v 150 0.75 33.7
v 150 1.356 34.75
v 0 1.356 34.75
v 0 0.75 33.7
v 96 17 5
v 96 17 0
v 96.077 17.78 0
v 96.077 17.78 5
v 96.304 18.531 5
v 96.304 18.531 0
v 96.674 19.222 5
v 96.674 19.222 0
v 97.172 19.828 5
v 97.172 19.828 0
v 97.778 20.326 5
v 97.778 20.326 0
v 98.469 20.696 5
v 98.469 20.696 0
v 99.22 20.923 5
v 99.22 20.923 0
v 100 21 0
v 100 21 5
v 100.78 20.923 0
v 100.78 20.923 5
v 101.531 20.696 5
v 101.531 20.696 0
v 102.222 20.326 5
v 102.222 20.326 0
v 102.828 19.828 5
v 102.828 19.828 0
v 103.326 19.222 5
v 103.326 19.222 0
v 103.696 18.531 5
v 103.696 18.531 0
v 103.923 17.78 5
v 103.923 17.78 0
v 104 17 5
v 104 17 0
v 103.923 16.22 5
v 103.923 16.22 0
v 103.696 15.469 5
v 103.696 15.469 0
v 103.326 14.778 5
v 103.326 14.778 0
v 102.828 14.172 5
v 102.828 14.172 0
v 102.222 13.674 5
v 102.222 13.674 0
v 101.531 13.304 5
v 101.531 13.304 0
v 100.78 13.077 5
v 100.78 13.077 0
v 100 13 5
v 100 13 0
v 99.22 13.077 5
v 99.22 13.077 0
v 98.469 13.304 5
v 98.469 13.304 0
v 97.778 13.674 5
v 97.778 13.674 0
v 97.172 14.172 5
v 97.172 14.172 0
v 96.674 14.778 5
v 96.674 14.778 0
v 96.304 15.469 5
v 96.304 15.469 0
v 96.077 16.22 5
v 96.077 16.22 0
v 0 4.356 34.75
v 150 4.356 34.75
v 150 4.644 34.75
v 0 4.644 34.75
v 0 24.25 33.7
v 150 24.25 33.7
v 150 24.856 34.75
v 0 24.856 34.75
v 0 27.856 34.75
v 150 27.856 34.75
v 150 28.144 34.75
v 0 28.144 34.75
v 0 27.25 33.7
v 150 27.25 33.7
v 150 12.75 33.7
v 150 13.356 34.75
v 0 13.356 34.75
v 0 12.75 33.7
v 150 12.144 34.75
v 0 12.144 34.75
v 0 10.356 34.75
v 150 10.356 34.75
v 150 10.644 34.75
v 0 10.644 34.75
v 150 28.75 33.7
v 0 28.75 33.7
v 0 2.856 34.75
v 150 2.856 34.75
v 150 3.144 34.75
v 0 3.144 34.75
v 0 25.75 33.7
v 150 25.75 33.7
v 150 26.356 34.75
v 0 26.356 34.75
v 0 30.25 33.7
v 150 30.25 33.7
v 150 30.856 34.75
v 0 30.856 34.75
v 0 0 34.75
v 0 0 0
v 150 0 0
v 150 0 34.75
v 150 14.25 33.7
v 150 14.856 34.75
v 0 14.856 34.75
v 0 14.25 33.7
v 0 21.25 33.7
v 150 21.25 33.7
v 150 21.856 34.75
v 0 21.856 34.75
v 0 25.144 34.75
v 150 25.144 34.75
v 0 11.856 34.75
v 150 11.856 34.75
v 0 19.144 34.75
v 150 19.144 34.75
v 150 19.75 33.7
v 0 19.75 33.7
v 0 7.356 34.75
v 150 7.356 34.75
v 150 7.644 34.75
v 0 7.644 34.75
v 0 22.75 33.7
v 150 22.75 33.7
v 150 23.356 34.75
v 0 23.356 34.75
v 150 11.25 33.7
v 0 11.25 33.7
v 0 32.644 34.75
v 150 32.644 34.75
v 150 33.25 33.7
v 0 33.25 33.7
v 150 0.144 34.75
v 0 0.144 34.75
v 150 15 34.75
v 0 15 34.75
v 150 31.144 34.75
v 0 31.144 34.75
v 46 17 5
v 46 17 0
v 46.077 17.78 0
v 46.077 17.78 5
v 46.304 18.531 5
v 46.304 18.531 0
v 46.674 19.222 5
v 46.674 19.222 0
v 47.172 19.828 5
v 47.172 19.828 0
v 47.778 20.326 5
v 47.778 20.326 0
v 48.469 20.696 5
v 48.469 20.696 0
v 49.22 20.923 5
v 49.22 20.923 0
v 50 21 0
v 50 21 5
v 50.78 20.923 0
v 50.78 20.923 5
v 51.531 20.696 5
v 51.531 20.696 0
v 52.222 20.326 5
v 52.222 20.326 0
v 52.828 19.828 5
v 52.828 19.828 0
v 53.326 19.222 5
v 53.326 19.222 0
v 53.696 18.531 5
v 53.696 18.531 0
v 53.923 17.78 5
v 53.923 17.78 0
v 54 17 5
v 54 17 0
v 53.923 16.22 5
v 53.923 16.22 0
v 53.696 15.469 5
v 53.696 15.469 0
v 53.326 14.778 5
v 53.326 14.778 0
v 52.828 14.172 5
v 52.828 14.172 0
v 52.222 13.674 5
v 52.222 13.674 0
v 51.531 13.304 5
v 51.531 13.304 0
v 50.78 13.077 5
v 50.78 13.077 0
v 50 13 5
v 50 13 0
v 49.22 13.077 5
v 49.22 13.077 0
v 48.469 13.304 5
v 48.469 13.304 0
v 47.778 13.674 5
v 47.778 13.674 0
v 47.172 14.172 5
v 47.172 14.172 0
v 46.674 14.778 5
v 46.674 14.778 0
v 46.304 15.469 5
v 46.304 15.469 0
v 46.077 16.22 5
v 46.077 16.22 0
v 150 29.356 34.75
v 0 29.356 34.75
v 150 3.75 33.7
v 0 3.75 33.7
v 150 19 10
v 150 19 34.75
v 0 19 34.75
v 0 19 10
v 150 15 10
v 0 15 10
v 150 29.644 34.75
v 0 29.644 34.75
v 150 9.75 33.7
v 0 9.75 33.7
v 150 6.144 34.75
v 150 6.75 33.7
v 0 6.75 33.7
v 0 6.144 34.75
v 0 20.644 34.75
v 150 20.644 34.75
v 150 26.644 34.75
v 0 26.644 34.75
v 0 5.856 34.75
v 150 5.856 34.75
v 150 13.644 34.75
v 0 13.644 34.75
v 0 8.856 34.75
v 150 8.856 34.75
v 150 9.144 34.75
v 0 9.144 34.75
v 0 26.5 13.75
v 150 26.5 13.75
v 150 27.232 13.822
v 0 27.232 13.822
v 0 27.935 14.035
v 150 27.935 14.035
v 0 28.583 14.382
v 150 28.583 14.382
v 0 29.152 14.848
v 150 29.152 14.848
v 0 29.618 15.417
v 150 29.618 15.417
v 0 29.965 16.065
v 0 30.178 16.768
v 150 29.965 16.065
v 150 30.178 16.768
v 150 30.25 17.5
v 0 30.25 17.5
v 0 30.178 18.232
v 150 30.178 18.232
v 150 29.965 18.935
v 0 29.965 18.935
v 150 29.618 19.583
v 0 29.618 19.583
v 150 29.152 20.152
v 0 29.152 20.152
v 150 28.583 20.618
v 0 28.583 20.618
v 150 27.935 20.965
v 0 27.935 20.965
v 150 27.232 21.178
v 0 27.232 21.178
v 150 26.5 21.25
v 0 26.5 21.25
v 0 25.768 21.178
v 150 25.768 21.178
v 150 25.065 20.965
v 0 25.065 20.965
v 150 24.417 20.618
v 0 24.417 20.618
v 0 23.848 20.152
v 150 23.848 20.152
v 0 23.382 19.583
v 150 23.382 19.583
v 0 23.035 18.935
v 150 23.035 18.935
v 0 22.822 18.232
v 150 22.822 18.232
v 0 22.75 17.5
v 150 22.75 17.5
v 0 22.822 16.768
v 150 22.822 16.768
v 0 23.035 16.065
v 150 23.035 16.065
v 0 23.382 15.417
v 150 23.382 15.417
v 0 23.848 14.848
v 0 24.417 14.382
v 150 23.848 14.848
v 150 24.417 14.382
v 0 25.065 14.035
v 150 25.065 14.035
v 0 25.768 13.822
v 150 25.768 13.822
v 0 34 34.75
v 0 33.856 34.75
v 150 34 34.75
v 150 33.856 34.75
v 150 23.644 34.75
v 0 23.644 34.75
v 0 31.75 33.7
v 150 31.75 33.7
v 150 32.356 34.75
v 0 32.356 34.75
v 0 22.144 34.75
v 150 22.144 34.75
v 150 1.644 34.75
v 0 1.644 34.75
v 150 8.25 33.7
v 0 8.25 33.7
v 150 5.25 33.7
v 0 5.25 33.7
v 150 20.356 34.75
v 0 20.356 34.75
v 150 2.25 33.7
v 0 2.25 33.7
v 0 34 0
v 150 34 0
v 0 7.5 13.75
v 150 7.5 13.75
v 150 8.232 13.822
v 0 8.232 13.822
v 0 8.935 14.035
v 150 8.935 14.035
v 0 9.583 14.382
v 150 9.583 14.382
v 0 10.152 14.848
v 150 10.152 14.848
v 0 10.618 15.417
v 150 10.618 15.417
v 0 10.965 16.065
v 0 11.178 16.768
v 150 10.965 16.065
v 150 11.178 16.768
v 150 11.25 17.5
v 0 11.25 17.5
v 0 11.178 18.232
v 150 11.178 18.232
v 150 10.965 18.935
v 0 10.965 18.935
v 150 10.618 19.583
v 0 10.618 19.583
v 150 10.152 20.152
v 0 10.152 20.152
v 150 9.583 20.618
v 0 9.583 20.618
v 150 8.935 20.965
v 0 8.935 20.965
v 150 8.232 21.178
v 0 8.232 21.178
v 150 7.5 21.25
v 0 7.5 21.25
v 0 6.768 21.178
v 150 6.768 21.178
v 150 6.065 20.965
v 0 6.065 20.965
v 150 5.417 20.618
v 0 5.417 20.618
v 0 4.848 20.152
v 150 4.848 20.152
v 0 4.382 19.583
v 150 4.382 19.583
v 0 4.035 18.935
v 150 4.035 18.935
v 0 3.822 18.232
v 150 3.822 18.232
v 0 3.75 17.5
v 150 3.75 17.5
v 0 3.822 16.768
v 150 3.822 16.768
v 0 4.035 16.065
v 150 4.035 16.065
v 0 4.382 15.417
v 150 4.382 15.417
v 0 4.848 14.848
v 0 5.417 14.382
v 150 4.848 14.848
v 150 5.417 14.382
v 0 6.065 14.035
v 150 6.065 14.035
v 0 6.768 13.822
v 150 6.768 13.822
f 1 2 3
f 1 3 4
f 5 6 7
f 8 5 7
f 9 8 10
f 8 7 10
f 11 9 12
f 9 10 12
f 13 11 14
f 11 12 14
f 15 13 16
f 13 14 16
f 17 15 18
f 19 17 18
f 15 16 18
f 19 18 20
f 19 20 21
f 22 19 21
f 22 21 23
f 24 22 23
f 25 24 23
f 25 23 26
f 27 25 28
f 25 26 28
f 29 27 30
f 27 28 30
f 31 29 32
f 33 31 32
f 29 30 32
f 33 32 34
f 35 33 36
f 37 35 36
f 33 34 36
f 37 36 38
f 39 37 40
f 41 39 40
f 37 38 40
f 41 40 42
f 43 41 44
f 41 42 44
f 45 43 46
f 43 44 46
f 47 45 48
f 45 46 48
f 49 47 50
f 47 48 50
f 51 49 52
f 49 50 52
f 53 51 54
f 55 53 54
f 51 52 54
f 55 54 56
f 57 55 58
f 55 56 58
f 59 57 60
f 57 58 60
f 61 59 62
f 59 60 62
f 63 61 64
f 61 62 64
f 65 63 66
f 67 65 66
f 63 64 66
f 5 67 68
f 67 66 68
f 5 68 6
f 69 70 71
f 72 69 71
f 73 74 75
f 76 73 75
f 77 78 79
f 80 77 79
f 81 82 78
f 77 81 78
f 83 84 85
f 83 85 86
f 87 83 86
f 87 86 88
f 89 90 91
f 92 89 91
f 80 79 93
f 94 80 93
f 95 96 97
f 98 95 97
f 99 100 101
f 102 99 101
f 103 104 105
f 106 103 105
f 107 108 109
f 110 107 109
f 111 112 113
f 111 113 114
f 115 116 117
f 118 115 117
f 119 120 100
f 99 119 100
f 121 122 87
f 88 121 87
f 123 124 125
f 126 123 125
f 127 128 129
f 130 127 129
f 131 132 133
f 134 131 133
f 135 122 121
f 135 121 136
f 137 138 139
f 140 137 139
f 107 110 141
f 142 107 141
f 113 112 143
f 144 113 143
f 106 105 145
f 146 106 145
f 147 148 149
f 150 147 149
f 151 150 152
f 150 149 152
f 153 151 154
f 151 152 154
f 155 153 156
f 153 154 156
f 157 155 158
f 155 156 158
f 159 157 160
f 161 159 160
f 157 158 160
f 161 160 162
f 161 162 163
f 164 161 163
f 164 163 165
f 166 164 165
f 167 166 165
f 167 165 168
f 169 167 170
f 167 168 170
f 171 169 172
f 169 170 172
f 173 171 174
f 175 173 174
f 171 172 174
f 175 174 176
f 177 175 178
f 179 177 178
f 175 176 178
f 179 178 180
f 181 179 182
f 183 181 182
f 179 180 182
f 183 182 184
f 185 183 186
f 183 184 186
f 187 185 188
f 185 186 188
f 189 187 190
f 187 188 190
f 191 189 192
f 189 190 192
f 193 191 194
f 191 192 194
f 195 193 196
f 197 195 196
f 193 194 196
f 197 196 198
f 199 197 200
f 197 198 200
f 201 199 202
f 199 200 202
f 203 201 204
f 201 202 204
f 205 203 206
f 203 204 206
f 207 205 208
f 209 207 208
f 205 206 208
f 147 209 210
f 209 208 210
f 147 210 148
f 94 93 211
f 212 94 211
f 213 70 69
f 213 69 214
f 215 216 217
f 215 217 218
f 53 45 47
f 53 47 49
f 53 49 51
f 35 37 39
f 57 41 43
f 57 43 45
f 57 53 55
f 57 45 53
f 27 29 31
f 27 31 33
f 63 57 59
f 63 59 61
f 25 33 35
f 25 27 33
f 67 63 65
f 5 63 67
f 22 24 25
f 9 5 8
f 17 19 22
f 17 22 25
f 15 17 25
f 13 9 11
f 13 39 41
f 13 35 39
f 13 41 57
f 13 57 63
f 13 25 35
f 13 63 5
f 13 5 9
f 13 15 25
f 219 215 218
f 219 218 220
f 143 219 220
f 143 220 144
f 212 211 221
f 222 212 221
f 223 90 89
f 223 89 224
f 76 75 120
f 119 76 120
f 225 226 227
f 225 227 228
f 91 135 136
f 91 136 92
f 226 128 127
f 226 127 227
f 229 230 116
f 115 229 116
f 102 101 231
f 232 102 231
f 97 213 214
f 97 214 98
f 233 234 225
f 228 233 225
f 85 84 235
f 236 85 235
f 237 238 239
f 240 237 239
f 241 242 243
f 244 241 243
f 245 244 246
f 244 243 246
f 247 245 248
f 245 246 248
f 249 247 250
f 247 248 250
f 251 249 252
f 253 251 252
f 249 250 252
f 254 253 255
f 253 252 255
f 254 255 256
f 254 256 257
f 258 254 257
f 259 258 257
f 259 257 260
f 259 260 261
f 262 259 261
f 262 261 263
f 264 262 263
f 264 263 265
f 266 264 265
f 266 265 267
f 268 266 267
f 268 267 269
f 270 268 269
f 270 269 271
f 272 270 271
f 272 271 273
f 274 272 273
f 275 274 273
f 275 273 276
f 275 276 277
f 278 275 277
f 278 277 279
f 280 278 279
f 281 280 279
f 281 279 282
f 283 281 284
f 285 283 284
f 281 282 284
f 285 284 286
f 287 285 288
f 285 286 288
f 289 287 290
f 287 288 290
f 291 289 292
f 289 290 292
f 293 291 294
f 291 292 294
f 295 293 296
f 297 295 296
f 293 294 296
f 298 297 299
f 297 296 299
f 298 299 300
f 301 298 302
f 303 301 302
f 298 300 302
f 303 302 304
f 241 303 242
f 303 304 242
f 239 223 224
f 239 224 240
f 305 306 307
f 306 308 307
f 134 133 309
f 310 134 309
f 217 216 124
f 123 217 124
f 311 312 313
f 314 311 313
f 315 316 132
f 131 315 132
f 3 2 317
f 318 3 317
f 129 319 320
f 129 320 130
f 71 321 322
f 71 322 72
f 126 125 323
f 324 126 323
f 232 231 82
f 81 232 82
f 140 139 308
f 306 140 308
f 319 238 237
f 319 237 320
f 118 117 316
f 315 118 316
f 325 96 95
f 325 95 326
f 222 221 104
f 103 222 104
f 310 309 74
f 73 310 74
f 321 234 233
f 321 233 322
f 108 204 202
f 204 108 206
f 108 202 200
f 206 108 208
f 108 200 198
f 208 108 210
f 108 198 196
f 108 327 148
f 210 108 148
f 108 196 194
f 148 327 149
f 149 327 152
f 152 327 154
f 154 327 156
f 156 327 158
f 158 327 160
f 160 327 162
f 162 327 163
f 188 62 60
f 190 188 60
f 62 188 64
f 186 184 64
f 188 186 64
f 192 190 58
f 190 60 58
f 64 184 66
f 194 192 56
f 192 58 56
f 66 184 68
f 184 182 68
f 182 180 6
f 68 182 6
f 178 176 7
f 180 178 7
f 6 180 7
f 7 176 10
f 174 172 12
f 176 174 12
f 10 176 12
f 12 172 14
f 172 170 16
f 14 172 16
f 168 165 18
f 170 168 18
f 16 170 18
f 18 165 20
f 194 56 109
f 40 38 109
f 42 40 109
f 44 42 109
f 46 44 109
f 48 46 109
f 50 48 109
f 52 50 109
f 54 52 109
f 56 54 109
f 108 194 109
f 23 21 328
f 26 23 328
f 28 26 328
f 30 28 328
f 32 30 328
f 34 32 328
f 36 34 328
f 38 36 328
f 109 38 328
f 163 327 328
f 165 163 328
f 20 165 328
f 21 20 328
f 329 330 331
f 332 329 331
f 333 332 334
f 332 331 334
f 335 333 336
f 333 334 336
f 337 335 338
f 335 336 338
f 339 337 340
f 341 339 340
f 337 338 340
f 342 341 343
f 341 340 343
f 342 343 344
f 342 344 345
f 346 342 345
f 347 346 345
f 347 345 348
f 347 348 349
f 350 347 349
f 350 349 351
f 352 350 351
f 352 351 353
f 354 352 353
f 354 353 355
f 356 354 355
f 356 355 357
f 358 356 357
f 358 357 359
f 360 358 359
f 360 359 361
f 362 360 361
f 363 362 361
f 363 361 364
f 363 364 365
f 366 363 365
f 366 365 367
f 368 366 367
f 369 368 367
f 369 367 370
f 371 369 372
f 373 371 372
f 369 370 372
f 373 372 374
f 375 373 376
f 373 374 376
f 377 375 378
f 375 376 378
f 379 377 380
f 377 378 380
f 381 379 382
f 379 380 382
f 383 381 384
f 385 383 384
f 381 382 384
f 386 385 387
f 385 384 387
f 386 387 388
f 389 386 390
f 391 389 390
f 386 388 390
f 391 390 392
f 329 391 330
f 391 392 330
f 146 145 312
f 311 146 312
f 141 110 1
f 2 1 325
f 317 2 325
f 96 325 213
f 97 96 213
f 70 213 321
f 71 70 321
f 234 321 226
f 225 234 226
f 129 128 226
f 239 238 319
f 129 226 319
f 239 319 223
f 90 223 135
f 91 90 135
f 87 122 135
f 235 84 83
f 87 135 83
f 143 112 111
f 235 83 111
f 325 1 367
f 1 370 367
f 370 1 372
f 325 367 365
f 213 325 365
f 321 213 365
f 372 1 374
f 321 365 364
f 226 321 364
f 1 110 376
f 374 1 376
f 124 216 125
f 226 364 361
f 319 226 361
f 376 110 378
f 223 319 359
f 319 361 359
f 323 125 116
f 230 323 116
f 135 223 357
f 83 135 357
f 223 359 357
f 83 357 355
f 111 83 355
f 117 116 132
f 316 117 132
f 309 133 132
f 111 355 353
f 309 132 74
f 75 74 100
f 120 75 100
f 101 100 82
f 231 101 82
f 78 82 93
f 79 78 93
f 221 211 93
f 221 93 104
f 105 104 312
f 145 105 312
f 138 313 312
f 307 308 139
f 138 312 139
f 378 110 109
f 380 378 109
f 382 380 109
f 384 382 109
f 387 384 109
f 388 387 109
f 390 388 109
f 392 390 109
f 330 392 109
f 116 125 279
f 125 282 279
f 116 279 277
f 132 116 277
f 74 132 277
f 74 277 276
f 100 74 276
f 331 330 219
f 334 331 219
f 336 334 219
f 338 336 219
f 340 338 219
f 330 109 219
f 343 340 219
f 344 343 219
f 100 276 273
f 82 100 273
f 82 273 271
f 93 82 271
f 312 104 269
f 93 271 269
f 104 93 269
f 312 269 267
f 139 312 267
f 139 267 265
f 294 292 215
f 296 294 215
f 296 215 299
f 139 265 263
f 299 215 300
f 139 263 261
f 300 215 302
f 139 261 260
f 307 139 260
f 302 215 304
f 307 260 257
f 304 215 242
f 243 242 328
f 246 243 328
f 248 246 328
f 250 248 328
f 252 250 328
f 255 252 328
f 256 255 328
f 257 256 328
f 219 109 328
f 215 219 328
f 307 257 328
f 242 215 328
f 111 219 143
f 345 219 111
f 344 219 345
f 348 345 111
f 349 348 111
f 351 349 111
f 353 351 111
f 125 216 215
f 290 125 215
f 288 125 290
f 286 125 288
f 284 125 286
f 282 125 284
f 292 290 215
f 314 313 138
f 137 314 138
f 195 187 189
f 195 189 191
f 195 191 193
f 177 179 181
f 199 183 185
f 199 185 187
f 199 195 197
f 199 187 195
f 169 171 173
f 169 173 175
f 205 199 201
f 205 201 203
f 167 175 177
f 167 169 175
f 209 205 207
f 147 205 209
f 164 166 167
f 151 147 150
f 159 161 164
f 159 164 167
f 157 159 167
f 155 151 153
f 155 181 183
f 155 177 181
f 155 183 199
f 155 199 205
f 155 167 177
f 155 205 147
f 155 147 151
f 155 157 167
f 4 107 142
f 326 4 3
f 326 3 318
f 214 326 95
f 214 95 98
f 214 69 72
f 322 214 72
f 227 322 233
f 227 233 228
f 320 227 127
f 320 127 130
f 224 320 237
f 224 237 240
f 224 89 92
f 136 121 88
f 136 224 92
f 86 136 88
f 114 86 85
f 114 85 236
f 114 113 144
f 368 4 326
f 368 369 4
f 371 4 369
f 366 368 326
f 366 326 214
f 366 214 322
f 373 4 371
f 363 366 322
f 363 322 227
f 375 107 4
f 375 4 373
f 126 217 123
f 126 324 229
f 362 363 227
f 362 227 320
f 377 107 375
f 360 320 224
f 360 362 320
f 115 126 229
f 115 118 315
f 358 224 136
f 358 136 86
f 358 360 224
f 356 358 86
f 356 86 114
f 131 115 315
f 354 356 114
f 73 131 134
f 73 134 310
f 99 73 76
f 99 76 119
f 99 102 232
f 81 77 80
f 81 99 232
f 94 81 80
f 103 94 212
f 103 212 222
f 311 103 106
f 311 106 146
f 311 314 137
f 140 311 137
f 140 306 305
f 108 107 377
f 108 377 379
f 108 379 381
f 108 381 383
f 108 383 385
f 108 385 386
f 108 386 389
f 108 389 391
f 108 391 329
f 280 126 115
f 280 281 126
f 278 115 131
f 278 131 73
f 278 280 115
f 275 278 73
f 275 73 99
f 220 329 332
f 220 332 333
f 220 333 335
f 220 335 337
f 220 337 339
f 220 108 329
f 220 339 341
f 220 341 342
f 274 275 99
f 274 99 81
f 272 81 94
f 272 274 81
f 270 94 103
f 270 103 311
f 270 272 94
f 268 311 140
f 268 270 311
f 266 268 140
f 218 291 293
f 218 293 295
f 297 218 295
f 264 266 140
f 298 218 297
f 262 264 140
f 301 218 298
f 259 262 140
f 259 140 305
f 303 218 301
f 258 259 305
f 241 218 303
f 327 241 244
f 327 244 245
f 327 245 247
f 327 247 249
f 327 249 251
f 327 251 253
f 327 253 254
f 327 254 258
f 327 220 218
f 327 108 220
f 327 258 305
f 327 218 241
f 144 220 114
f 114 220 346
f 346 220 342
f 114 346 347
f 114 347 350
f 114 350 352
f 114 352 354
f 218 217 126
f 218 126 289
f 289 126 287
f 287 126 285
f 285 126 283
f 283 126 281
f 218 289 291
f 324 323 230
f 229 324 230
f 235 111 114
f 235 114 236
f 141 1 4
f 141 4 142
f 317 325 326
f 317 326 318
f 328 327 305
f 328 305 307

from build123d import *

# Parameters (mm, degrees)
SKETCH1_W           = 150
SKETCH1_H           = 34
BOSS_EXTRUDE1_DEPTH = 35
CUT_EXTRUDE1_DEPTH  = 160
SKETCH7_R           = 3.75
CUT_EXTRUDE9_DEPTH  = 160
CUT_EXTRUDE11_DEPTH = 158.737123088
SKETCH8_W           = 0.25
SKETCH8_H           = 34
CUT_EXTRUDE12_DEPTH = 158.737123088
SKETCH9_R           = 4
CUT_EXTRUDE13_DEPTH = 5


with BuildPart() as part:
    # Sketch1 → Boss-Extrude1 (new body)
    with BuildSketch(Plane.XY):
        with Locations((75, 17)):
            Rectangle(SKETCH1_W, SKETCH1_H)
    extrude(amount=BOSS_EXTRUDE1_DEPTH)

    # Sketch2 → Cut-Extrude1 (cut)
    with BuildSketch(Plane(origin=(150, 0, 0), x_dir=(0, 0, -1), z_dir=(1, 0, 0))):
        Polygon((-35, 17), (-35, 19), (-10, 19), (-10, 15), (-35, 15), align=None)
    extrude(amount=-CUT_EXTRUDE1_DEPTH, mode=Mode.SUBTRACT)

    # Sketch7 → Cut-Extrude9 (cut)
    with BuildSketch(Plane(origin=(150, 0, 0), x_dir=(0, 0, -1), z_dir=(1, 0, 0))):
        with Locations((-17.5, 26.5)):
            Circle(SKETCH7_R)
        with Locations((-17.5, 7.5)):
            Circle(SKETCH7_R)
    extrude(amount=-CUT_EXTRUDE9_DEPTH, mode=Mode.SUBTRACT)

    # Sketch3 → Cut-Extrude11 (cut, through all)
    with BuildSketch(Plane(origin=(150, 0, 0), x_dir=(0, 0, -1), z_dir=(1, 0, 0))):
        Polygon((-33.7, 19.75), (-35, 20.5), (-35, 19), align=None)
        Polygon((-33.7, 21.25), (-35, 22), (-35, 20.5), align=None)
        Polygon((-33.7, 22.75), (-35, 23.5), (-35, 22), align=None)
        Polygon((-33.7, 24.25), (-35, 25), (-35, 23.5), align=None)
        Polygon((-33.7, 25.75), (-35, 26.5), (-35, 25), align=None)
        Polygon((-33.7, 27.25), (-35, 28), (-35, 26.5), align=None)
        Polygon((-33.7, 28.75), (-35, 29.5), (-35, 28), align=None)
        Polygon((-33.7, 30.25), (-35, 31), (-35, 29.5), align=None)
        Polygon((-35, 34.75), (-35, 34), (-33.7, 34.75), align=None)
        Polygon((-35, 34), (-35, 32.5), (-33.7, 33.25), align=None)
        Polygon((-33.7, 31.75), (-35, 32.5), (-35, 31), align=None)
    cut_extrude11 = extrude(amount=-CUT_EXTRUDE11_DEPTH, mode=Mode.SUBTRACT)

    # Mirror1: Cut-Extrude11 across plane
    add(cut_extrude11.mirror(Plane.ZX.offset(17)), mode=Mode.SUBTRACT)

    # Sketch8 → Cut-Extrude12 (cut, through all)
    with BuildSketch(Plane(origin=(150, 0, 0), x_dir=(0, 0, -1), z_dir=(1, 0, 0))):
        with Locations((-34.875, 17)):
            Rectangle(SKETCH8_W, SKETCH8_H)
    extrude(amount=-CUT_EXTRUDE12_DEPTH, mode=Mode.SUBTRACT)

    # Sketch9 → Cut-Extrude13 (cut)
    with BuildSketch(Plane(origin=(0, 0, 0), x_dir=(-1, 0, 0), z_dir=(0, 0, -1))):
        with Locations((-50, 17)):
            Circle(SKETCH9_R)
        with Locations((-100, 17)):
            Circle(SKETCH9_R)
    extrude(amount=-CUT_EXTRUDE13_DEPTH, mode=Mode.SUBTRACT)


solid = part.part
